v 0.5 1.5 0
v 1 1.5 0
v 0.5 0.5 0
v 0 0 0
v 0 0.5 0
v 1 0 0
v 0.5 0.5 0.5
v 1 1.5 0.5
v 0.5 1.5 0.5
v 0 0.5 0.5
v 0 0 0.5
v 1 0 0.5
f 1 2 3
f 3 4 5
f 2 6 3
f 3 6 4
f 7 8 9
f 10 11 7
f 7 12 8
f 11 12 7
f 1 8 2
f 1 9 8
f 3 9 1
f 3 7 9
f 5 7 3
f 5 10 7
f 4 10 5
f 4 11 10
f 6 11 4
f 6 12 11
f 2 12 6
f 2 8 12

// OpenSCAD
// Tetromino (J) for Stacks of Shapes
// by Slashee the Cow
linear_extrude(0.5)
polygon([[0,0],[1,0],[1,1.5],[0.5,1.5],[0.5,0.5],[0,0.5]]);
